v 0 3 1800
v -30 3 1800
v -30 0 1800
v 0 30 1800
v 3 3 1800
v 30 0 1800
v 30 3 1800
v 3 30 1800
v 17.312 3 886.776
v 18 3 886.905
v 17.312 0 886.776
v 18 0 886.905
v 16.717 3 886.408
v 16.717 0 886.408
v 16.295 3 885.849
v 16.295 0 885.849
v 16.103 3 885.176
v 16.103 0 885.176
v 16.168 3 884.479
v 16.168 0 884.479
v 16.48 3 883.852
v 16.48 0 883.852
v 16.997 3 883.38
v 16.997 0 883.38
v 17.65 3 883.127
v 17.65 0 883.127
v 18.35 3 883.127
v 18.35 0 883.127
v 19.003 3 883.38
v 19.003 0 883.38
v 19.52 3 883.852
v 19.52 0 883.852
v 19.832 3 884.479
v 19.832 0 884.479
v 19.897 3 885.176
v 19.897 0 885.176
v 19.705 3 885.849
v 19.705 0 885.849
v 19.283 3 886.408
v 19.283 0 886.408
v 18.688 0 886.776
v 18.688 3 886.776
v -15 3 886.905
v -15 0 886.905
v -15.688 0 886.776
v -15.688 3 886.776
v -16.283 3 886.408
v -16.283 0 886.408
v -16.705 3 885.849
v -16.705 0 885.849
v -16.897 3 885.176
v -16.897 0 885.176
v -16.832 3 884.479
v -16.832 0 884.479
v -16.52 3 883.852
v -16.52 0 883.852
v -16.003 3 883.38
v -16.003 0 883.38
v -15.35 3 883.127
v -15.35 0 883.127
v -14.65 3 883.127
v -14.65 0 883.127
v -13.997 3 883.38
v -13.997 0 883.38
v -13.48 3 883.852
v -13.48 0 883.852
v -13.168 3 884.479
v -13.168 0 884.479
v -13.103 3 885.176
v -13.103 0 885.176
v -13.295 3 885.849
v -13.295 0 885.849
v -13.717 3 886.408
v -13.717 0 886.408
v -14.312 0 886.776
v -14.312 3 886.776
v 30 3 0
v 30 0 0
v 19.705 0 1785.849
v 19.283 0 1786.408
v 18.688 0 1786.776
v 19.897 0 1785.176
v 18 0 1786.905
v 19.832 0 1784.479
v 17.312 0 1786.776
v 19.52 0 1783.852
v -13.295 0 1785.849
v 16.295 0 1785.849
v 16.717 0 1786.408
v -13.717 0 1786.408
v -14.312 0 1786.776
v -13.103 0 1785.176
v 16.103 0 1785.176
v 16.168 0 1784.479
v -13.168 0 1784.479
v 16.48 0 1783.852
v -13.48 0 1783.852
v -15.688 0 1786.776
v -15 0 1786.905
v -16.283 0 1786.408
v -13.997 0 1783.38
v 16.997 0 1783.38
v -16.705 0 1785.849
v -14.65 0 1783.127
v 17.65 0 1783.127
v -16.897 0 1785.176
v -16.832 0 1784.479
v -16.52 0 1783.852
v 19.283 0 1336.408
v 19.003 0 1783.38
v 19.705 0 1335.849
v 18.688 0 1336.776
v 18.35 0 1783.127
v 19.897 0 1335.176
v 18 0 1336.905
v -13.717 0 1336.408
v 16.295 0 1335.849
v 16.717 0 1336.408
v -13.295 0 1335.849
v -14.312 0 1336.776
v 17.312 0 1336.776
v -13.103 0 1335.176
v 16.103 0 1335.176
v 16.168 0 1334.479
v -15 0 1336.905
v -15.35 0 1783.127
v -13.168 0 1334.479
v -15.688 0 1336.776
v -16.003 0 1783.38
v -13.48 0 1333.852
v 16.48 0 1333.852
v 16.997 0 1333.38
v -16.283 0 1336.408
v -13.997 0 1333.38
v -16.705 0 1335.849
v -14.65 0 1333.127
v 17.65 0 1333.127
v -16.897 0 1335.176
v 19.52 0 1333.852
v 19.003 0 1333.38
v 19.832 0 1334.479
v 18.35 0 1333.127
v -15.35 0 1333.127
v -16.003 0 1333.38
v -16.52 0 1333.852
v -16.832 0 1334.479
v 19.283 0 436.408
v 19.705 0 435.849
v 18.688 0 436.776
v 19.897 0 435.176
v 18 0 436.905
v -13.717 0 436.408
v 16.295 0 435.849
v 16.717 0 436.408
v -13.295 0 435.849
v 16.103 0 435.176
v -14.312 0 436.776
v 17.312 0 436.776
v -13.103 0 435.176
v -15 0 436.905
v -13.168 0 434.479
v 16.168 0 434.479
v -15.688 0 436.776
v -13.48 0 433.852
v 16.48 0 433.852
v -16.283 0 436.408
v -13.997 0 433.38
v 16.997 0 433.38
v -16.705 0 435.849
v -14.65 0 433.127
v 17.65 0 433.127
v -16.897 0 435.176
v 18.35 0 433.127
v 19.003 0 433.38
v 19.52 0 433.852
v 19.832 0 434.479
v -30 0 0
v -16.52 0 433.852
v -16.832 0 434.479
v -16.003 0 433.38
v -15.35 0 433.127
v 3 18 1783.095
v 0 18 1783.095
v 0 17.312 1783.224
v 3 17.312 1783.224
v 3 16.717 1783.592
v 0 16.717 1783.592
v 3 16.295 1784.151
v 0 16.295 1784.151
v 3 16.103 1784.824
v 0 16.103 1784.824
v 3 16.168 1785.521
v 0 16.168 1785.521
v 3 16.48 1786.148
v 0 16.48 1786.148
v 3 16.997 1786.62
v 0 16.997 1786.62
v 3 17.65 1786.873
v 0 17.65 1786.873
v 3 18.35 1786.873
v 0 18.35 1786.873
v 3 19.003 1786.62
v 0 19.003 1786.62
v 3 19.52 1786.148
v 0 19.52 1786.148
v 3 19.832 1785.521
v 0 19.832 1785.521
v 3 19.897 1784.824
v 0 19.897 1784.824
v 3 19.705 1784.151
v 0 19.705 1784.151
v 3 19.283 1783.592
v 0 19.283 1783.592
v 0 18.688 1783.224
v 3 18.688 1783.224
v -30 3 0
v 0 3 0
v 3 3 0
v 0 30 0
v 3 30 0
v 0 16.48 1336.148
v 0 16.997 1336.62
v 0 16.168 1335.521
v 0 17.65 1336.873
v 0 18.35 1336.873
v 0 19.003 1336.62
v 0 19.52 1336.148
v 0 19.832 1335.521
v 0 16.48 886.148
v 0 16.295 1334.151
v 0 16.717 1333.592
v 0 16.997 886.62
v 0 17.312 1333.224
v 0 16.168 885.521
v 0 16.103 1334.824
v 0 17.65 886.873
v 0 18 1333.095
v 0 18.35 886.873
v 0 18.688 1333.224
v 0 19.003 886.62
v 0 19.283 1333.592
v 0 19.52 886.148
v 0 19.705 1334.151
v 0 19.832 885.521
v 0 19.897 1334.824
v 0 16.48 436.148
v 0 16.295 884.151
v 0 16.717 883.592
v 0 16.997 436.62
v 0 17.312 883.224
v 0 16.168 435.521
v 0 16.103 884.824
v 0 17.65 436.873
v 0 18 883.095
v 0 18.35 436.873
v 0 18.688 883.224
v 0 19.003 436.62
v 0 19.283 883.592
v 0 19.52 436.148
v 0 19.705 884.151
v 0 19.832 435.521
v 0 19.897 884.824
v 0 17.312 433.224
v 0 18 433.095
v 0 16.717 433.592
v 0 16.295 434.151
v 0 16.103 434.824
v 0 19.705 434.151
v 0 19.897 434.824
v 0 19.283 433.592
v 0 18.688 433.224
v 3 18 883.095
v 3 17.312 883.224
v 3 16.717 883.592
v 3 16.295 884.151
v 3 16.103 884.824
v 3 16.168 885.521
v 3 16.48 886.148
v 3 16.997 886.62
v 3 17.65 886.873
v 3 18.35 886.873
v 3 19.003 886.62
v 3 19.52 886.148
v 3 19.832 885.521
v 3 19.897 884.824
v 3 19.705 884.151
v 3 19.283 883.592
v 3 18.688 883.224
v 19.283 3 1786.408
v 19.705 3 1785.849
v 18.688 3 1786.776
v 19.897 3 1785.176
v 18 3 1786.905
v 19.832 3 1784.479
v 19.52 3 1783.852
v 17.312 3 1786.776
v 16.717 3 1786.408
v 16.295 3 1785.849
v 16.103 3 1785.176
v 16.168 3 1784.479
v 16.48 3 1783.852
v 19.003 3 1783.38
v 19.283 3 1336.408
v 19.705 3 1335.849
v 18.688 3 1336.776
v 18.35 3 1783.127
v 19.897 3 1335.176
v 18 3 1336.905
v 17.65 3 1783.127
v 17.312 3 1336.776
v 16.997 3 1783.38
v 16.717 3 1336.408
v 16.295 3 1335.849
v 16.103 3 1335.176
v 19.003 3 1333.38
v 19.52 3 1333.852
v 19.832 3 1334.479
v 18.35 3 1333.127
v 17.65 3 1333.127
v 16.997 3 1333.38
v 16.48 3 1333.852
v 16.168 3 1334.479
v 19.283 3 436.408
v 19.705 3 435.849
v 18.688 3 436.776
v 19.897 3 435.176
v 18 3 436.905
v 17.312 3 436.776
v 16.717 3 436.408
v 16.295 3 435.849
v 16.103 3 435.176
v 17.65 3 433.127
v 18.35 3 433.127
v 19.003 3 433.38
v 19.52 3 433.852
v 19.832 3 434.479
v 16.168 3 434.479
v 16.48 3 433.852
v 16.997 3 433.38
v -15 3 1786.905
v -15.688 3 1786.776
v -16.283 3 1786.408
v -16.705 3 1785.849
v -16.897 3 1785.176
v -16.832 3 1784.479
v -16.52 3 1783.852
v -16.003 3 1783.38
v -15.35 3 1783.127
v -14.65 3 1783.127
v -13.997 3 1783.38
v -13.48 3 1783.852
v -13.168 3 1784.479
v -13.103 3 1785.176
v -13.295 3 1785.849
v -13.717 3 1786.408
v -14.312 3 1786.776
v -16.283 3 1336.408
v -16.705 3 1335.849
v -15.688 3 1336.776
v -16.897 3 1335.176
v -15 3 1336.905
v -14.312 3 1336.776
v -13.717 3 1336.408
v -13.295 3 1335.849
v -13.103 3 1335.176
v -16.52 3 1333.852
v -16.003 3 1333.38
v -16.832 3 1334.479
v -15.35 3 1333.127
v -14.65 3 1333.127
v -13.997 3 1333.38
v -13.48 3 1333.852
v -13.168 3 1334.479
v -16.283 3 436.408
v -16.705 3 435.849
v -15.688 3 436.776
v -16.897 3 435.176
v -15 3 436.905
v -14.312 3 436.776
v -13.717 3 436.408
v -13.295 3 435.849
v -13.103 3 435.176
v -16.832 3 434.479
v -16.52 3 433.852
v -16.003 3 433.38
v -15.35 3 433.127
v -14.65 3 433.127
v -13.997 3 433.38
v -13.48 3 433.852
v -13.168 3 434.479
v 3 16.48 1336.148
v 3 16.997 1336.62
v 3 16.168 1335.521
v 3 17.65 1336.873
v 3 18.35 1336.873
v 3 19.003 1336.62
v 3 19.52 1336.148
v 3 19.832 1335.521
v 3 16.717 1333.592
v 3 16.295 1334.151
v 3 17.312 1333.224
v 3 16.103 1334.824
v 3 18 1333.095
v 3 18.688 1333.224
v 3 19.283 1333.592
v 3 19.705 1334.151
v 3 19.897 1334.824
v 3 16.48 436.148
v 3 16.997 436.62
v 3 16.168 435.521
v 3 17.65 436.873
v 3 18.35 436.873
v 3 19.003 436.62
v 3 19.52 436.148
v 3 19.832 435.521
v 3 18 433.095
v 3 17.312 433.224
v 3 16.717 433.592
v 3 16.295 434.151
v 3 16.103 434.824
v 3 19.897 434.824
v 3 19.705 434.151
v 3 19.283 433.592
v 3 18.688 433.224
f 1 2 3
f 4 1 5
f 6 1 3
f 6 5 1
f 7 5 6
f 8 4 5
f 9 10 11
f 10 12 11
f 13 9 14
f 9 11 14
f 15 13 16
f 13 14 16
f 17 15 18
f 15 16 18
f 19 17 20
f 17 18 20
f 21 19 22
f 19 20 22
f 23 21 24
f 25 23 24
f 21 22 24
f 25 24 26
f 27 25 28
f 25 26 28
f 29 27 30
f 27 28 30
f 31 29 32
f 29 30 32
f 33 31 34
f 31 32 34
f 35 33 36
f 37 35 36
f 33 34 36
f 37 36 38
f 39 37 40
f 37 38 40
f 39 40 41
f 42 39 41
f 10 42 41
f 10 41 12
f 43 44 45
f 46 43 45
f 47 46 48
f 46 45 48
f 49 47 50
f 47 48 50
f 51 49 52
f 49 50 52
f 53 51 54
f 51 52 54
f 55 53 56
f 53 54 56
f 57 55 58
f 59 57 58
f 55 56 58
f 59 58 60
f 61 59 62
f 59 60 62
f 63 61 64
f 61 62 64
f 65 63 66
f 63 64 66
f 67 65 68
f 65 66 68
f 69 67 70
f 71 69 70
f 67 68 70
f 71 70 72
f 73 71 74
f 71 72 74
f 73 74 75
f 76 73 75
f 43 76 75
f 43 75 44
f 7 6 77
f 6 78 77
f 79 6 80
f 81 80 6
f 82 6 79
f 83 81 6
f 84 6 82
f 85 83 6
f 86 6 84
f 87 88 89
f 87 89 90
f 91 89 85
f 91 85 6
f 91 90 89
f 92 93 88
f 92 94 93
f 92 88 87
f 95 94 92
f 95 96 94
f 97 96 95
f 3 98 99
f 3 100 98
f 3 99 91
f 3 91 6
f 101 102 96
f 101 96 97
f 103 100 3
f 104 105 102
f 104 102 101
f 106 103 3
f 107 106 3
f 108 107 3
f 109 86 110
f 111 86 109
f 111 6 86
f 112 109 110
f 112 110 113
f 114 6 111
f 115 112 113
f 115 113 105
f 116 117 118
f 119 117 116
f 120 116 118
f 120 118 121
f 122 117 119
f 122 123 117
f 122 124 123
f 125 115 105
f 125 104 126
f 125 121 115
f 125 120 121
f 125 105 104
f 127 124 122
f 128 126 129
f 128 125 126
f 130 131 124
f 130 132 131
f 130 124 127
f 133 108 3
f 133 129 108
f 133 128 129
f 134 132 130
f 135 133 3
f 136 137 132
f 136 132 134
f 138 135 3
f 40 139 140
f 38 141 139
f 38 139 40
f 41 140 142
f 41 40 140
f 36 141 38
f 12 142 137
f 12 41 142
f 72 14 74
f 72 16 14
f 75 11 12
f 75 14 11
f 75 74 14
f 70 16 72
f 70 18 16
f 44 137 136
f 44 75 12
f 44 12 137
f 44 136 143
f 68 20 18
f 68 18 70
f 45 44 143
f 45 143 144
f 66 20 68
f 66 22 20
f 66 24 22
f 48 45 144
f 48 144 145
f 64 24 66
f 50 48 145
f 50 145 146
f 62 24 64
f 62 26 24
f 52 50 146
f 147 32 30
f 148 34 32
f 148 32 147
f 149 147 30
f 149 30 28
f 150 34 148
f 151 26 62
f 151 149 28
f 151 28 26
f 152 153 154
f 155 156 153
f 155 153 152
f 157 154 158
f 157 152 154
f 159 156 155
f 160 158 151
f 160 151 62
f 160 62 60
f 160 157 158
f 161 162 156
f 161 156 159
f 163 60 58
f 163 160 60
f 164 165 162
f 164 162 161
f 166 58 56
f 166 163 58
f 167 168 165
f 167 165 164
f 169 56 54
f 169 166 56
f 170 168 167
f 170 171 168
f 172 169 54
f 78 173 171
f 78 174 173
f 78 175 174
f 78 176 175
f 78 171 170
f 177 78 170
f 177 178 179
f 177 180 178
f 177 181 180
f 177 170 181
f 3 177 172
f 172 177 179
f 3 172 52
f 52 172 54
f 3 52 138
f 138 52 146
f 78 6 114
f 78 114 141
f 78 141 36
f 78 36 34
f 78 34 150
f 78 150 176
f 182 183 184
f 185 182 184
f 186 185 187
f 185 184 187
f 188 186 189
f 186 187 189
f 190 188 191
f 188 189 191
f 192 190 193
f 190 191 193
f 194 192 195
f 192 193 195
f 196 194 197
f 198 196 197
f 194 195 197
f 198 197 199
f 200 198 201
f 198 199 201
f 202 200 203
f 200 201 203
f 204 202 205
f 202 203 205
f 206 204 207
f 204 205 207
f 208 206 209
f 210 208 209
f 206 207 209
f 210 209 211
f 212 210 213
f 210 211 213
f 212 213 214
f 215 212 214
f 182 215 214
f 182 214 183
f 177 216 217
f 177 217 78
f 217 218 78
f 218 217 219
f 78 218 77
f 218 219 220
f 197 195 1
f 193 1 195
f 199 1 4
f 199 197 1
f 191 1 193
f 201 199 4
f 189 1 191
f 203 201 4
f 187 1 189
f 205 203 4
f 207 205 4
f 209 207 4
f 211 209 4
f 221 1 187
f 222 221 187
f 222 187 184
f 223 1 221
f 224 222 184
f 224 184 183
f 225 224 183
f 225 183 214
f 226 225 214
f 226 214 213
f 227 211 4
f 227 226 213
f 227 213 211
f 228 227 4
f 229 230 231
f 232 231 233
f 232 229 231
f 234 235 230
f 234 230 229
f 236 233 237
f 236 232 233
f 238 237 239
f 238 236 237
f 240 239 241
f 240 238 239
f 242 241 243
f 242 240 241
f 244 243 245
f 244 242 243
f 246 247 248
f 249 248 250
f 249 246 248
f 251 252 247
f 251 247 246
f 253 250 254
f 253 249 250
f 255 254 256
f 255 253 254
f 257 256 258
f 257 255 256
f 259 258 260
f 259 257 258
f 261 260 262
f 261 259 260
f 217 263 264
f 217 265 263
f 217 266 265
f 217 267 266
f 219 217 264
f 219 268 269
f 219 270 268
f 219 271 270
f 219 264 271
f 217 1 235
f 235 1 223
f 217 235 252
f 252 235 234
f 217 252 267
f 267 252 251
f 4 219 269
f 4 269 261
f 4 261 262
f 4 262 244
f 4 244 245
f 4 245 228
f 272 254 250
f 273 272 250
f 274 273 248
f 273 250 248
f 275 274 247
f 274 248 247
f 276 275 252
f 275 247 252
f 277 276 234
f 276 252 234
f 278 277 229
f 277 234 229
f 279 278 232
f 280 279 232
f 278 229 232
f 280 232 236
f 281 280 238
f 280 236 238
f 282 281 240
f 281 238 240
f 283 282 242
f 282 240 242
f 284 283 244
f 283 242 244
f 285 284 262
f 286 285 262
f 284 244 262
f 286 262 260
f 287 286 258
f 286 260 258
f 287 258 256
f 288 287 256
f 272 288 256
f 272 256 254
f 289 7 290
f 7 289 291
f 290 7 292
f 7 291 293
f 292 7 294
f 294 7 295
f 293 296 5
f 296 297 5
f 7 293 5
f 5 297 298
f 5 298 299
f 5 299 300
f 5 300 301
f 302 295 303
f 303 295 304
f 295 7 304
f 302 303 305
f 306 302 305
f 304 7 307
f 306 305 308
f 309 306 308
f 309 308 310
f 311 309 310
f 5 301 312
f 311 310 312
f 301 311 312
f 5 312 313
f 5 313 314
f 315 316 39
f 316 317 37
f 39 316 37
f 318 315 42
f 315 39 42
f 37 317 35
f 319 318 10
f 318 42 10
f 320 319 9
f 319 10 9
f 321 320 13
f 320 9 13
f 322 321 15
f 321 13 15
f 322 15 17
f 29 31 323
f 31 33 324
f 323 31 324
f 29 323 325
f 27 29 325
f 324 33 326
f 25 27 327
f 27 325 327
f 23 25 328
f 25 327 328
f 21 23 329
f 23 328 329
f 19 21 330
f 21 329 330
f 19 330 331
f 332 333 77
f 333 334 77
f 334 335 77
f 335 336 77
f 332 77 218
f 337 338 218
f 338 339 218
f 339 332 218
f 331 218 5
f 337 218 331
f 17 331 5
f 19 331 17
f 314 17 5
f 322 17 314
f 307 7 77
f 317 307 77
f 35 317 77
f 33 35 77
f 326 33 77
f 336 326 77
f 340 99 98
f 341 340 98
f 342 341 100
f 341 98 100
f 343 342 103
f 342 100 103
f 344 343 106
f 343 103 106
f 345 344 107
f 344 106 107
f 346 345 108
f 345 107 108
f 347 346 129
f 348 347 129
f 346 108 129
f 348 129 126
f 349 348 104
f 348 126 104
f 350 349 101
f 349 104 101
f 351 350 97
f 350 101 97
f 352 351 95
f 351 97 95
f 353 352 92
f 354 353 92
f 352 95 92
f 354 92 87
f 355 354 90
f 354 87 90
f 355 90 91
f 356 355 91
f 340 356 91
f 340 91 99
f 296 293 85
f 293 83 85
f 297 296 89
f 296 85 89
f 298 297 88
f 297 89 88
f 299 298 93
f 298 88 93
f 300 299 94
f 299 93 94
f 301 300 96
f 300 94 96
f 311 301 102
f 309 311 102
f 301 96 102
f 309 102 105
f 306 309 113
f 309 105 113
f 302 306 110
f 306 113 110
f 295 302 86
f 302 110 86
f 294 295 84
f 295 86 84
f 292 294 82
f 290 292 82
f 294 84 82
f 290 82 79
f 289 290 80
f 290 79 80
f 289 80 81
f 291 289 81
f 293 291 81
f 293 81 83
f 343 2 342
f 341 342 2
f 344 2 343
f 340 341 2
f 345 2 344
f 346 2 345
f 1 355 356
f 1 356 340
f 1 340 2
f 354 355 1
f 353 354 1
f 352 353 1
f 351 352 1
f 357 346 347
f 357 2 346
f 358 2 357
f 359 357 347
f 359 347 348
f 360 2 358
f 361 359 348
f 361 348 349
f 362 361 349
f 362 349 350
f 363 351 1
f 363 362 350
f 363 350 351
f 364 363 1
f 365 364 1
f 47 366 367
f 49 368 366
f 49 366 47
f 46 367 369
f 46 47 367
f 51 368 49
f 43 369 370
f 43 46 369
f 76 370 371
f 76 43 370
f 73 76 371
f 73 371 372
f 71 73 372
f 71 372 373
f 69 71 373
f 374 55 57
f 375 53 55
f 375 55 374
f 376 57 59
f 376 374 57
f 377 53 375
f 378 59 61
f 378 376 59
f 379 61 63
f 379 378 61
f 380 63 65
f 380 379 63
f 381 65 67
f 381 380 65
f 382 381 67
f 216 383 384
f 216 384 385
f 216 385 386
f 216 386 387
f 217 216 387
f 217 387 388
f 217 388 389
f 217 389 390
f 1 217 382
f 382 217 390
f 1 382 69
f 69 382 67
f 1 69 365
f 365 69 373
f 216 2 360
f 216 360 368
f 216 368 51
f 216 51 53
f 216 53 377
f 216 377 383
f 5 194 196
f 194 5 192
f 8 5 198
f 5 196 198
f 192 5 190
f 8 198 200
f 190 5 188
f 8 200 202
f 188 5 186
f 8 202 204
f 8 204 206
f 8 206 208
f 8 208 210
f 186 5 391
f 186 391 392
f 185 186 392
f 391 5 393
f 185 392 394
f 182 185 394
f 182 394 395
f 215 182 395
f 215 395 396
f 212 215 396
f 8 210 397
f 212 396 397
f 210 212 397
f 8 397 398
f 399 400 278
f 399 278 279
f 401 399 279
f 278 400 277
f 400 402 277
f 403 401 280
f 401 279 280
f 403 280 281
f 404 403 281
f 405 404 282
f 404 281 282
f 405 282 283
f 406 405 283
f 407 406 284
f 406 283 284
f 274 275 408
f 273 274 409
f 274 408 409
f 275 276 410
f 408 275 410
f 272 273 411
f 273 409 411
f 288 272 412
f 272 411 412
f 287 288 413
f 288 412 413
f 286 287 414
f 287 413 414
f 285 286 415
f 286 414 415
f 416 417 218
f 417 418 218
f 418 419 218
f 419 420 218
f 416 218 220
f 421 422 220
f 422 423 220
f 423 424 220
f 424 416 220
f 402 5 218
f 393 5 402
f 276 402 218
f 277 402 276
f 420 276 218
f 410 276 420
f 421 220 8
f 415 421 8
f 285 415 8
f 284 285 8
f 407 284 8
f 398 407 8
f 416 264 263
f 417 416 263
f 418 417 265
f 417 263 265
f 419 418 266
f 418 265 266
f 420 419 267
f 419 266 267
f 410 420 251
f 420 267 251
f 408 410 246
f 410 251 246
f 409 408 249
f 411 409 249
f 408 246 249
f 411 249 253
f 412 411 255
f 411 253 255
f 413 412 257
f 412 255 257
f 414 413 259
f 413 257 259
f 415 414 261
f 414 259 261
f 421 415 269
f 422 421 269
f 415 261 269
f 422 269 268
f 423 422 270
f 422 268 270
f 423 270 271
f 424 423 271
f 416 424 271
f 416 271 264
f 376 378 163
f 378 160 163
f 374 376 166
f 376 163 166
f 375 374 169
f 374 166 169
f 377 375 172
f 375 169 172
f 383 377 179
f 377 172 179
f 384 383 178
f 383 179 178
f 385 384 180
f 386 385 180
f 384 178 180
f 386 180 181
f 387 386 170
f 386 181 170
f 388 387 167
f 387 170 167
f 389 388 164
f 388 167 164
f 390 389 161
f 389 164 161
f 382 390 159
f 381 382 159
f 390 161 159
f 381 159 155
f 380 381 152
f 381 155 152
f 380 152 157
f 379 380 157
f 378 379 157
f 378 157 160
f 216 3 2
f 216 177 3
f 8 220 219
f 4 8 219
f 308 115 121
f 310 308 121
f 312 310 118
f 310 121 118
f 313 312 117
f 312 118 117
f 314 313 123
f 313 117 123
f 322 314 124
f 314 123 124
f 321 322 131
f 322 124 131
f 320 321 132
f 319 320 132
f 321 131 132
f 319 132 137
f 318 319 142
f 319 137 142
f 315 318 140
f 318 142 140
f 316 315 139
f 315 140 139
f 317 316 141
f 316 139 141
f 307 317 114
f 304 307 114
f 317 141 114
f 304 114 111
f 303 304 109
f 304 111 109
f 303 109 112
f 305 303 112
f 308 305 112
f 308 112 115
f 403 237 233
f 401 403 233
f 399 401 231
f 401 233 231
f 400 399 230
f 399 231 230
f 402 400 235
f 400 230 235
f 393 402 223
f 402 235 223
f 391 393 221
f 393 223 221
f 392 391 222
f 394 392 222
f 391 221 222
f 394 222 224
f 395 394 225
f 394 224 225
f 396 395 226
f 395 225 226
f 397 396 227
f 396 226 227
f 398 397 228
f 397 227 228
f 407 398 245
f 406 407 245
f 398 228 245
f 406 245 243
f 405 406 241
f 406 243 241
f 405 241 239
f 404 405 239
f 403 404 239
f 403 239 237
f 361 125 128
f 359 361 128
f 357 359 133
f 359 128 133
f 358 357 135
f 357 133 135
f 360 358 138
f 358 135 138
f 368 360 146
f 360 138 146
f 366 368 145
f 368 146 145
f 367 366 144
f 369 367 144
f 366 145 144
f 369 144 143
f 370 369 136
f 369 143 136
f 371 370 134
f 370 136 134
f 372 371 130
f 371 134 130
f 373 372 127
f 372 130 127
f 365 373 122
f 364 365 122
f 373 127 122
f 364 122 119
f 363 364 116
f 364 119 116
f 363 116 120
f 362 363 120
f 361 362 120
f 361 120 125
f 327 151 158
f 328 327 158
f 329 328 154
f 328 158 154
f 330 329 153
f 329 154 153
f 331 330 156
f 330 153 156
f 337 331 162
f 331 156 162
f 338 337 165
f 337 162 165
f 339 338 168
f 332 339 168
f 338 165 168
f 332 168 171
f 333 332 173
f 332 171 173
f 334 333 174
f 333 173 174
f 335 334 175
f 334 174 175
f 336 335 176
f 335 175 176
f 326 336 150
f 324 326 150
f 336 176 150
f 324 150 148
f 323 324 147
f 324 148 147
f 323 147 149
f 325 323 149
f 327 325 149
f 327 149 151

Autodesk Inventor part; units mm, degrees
ref_plane "YZ Plane" through (0, 0, 0) normal (1, 0, 0) x (0, 1, 0)
ref_plane "XZ Plane" through (0, 0, 0) normal (0, 1, 0) x (-1, 0, 0)
ref_plane "XY Plane" through (0, 0, 0) normal (0, 0, 1) x (1, 0, 0)
sketch "Sketch1" plane through (0, 0, 0) normal (0, 0, 1) x (1, 0, 0)
  line L0 (0, 0) -> (30, 0)
  line L1 (30, 0) -> (30, 3)
  line L2 (30, 3) -> (3, 3)
  line L3 (3, 3) -> (3, 30)
  line L4 (3, 30) -> (0, 30)
  line L5 (0, 0) -> (-30, 0)
  line L6 (-30, 0) -> (-30, 3)
  line L7 (-30, 3) -> (0, 3)
  line L8 (0, 3) -> (0, 30)
  dimension "d0" = 3
  dimension "d2" = 30
  dimension "d5" = 3
extrude "Extrusion1" add sketch "Sketch1" along normal blind 1800
sketch "Sketch2" plane through (3, 3, 1800) normal (0, 1, 0) x (1, 0, 0)
  line L0 (-3, 0) -> (-33, 0) projected
  line L1 (-3, 1800) -> (-3, 0) projected
  line L2 (0, 1800) -> (0, 0) projected
  line L3 (27, 0) -> (0, 0) projected
  point P0 (15, 15)
  point P1 (-18, 15)
  point P2 (-18, 465)
  point P3 (15, 465)
  point P4 (15, 915)
  point P5 (-18, 915)
  point P6 (-18, 1365)
  point P7 (15, 1365)
  dimension "d8" = 15
  dimension "d9" = 15
  dimension "d10" = 15
  dimension "d11" = 15
  dimension "d12" = 450
  dimension "d13" = 450
  dimension "d14" = 15
  dimension "d15" = 15
  dimension "d16" = 450
  dimension "d17" = 450
  dimension "d18" = 15
  dimension "d19" = 15
  dimension "d20" = 450
  dimension "d21" = 450
  dimension "d22" = 15
  dimension "d23" = 15
hole "Hole1" at (18, 3, 1785) at (-15, 3, 1785) at (-15, 3, 1335) at (18, 3, 1335) at (18, 3, 885) at (-15, 3, 885) at (-15, 3, 435) at (18, 3, 435) direction (0, -1, 0) diameter 3.81 end through all
sketch "Sketch3" plane through (3, 30, 1800) normal (1, 0, 0) x (0, 0, -1)
  line L0 (0, -27) -> (0, 0) projected
  line L1 (1800, -27) -> (0, -27) projected
  point P0 (1800, -30)
  point P1 (15, -12)
  point P2 (465, -12)
  point P3 (915, -12)
  point P4 (1365, -12)
  dimension "d31" = 15
  dimension "d32" = 15
  dimension "d33" = 450
  dimension "d34" = 15
  dimension "d35" = 450
  dimension "d36" = 450
  dimension "d37" = 15
  dimension "d38" = 15
hole "Hole2" at (3, 18, 1785) at (3, 18, 1335) at (3, 18, 885) at (3, 18, 435) direction (-1, 0, 0) diameter 3.81 end through all
equation "\"d0\" = Thickness"
equation "\"d2\" = Width"
equation "\"d5\" = Thickness"
equation "\"d6\" = Height"
equation "\"d8\" = HoleDistance"
equation "\"d9\" = HoleDistance"
equation "\"d10\" = HoleDistance"
equation "\"d11\" = HoleDistance"
equation "\"d14\" = HoleDistance"
equation "\"d15\" = HoleDistance"
equation "\"d18\" = HoleDistance"
equation "\"d19\" = HoleDistance"
equation "\"d22\" = HoleDistance"
equation "\"d23\" = HoleDistance"
equation "\"d31\" = HoleDistance"
equation "\"d32\" = HoleDistance"
equation "\"d34\" = HoleDistance"
equation "\"d37\" = HoleDistance"
equation "\"d38\" = HoleDistance"
equation "\"Width\" = 30"
equation "\"Thickness\" = 3"
equation "\"Height\" = 1800"
equation "\"HoleDistance\" = 15"
properties part number "mid180"
